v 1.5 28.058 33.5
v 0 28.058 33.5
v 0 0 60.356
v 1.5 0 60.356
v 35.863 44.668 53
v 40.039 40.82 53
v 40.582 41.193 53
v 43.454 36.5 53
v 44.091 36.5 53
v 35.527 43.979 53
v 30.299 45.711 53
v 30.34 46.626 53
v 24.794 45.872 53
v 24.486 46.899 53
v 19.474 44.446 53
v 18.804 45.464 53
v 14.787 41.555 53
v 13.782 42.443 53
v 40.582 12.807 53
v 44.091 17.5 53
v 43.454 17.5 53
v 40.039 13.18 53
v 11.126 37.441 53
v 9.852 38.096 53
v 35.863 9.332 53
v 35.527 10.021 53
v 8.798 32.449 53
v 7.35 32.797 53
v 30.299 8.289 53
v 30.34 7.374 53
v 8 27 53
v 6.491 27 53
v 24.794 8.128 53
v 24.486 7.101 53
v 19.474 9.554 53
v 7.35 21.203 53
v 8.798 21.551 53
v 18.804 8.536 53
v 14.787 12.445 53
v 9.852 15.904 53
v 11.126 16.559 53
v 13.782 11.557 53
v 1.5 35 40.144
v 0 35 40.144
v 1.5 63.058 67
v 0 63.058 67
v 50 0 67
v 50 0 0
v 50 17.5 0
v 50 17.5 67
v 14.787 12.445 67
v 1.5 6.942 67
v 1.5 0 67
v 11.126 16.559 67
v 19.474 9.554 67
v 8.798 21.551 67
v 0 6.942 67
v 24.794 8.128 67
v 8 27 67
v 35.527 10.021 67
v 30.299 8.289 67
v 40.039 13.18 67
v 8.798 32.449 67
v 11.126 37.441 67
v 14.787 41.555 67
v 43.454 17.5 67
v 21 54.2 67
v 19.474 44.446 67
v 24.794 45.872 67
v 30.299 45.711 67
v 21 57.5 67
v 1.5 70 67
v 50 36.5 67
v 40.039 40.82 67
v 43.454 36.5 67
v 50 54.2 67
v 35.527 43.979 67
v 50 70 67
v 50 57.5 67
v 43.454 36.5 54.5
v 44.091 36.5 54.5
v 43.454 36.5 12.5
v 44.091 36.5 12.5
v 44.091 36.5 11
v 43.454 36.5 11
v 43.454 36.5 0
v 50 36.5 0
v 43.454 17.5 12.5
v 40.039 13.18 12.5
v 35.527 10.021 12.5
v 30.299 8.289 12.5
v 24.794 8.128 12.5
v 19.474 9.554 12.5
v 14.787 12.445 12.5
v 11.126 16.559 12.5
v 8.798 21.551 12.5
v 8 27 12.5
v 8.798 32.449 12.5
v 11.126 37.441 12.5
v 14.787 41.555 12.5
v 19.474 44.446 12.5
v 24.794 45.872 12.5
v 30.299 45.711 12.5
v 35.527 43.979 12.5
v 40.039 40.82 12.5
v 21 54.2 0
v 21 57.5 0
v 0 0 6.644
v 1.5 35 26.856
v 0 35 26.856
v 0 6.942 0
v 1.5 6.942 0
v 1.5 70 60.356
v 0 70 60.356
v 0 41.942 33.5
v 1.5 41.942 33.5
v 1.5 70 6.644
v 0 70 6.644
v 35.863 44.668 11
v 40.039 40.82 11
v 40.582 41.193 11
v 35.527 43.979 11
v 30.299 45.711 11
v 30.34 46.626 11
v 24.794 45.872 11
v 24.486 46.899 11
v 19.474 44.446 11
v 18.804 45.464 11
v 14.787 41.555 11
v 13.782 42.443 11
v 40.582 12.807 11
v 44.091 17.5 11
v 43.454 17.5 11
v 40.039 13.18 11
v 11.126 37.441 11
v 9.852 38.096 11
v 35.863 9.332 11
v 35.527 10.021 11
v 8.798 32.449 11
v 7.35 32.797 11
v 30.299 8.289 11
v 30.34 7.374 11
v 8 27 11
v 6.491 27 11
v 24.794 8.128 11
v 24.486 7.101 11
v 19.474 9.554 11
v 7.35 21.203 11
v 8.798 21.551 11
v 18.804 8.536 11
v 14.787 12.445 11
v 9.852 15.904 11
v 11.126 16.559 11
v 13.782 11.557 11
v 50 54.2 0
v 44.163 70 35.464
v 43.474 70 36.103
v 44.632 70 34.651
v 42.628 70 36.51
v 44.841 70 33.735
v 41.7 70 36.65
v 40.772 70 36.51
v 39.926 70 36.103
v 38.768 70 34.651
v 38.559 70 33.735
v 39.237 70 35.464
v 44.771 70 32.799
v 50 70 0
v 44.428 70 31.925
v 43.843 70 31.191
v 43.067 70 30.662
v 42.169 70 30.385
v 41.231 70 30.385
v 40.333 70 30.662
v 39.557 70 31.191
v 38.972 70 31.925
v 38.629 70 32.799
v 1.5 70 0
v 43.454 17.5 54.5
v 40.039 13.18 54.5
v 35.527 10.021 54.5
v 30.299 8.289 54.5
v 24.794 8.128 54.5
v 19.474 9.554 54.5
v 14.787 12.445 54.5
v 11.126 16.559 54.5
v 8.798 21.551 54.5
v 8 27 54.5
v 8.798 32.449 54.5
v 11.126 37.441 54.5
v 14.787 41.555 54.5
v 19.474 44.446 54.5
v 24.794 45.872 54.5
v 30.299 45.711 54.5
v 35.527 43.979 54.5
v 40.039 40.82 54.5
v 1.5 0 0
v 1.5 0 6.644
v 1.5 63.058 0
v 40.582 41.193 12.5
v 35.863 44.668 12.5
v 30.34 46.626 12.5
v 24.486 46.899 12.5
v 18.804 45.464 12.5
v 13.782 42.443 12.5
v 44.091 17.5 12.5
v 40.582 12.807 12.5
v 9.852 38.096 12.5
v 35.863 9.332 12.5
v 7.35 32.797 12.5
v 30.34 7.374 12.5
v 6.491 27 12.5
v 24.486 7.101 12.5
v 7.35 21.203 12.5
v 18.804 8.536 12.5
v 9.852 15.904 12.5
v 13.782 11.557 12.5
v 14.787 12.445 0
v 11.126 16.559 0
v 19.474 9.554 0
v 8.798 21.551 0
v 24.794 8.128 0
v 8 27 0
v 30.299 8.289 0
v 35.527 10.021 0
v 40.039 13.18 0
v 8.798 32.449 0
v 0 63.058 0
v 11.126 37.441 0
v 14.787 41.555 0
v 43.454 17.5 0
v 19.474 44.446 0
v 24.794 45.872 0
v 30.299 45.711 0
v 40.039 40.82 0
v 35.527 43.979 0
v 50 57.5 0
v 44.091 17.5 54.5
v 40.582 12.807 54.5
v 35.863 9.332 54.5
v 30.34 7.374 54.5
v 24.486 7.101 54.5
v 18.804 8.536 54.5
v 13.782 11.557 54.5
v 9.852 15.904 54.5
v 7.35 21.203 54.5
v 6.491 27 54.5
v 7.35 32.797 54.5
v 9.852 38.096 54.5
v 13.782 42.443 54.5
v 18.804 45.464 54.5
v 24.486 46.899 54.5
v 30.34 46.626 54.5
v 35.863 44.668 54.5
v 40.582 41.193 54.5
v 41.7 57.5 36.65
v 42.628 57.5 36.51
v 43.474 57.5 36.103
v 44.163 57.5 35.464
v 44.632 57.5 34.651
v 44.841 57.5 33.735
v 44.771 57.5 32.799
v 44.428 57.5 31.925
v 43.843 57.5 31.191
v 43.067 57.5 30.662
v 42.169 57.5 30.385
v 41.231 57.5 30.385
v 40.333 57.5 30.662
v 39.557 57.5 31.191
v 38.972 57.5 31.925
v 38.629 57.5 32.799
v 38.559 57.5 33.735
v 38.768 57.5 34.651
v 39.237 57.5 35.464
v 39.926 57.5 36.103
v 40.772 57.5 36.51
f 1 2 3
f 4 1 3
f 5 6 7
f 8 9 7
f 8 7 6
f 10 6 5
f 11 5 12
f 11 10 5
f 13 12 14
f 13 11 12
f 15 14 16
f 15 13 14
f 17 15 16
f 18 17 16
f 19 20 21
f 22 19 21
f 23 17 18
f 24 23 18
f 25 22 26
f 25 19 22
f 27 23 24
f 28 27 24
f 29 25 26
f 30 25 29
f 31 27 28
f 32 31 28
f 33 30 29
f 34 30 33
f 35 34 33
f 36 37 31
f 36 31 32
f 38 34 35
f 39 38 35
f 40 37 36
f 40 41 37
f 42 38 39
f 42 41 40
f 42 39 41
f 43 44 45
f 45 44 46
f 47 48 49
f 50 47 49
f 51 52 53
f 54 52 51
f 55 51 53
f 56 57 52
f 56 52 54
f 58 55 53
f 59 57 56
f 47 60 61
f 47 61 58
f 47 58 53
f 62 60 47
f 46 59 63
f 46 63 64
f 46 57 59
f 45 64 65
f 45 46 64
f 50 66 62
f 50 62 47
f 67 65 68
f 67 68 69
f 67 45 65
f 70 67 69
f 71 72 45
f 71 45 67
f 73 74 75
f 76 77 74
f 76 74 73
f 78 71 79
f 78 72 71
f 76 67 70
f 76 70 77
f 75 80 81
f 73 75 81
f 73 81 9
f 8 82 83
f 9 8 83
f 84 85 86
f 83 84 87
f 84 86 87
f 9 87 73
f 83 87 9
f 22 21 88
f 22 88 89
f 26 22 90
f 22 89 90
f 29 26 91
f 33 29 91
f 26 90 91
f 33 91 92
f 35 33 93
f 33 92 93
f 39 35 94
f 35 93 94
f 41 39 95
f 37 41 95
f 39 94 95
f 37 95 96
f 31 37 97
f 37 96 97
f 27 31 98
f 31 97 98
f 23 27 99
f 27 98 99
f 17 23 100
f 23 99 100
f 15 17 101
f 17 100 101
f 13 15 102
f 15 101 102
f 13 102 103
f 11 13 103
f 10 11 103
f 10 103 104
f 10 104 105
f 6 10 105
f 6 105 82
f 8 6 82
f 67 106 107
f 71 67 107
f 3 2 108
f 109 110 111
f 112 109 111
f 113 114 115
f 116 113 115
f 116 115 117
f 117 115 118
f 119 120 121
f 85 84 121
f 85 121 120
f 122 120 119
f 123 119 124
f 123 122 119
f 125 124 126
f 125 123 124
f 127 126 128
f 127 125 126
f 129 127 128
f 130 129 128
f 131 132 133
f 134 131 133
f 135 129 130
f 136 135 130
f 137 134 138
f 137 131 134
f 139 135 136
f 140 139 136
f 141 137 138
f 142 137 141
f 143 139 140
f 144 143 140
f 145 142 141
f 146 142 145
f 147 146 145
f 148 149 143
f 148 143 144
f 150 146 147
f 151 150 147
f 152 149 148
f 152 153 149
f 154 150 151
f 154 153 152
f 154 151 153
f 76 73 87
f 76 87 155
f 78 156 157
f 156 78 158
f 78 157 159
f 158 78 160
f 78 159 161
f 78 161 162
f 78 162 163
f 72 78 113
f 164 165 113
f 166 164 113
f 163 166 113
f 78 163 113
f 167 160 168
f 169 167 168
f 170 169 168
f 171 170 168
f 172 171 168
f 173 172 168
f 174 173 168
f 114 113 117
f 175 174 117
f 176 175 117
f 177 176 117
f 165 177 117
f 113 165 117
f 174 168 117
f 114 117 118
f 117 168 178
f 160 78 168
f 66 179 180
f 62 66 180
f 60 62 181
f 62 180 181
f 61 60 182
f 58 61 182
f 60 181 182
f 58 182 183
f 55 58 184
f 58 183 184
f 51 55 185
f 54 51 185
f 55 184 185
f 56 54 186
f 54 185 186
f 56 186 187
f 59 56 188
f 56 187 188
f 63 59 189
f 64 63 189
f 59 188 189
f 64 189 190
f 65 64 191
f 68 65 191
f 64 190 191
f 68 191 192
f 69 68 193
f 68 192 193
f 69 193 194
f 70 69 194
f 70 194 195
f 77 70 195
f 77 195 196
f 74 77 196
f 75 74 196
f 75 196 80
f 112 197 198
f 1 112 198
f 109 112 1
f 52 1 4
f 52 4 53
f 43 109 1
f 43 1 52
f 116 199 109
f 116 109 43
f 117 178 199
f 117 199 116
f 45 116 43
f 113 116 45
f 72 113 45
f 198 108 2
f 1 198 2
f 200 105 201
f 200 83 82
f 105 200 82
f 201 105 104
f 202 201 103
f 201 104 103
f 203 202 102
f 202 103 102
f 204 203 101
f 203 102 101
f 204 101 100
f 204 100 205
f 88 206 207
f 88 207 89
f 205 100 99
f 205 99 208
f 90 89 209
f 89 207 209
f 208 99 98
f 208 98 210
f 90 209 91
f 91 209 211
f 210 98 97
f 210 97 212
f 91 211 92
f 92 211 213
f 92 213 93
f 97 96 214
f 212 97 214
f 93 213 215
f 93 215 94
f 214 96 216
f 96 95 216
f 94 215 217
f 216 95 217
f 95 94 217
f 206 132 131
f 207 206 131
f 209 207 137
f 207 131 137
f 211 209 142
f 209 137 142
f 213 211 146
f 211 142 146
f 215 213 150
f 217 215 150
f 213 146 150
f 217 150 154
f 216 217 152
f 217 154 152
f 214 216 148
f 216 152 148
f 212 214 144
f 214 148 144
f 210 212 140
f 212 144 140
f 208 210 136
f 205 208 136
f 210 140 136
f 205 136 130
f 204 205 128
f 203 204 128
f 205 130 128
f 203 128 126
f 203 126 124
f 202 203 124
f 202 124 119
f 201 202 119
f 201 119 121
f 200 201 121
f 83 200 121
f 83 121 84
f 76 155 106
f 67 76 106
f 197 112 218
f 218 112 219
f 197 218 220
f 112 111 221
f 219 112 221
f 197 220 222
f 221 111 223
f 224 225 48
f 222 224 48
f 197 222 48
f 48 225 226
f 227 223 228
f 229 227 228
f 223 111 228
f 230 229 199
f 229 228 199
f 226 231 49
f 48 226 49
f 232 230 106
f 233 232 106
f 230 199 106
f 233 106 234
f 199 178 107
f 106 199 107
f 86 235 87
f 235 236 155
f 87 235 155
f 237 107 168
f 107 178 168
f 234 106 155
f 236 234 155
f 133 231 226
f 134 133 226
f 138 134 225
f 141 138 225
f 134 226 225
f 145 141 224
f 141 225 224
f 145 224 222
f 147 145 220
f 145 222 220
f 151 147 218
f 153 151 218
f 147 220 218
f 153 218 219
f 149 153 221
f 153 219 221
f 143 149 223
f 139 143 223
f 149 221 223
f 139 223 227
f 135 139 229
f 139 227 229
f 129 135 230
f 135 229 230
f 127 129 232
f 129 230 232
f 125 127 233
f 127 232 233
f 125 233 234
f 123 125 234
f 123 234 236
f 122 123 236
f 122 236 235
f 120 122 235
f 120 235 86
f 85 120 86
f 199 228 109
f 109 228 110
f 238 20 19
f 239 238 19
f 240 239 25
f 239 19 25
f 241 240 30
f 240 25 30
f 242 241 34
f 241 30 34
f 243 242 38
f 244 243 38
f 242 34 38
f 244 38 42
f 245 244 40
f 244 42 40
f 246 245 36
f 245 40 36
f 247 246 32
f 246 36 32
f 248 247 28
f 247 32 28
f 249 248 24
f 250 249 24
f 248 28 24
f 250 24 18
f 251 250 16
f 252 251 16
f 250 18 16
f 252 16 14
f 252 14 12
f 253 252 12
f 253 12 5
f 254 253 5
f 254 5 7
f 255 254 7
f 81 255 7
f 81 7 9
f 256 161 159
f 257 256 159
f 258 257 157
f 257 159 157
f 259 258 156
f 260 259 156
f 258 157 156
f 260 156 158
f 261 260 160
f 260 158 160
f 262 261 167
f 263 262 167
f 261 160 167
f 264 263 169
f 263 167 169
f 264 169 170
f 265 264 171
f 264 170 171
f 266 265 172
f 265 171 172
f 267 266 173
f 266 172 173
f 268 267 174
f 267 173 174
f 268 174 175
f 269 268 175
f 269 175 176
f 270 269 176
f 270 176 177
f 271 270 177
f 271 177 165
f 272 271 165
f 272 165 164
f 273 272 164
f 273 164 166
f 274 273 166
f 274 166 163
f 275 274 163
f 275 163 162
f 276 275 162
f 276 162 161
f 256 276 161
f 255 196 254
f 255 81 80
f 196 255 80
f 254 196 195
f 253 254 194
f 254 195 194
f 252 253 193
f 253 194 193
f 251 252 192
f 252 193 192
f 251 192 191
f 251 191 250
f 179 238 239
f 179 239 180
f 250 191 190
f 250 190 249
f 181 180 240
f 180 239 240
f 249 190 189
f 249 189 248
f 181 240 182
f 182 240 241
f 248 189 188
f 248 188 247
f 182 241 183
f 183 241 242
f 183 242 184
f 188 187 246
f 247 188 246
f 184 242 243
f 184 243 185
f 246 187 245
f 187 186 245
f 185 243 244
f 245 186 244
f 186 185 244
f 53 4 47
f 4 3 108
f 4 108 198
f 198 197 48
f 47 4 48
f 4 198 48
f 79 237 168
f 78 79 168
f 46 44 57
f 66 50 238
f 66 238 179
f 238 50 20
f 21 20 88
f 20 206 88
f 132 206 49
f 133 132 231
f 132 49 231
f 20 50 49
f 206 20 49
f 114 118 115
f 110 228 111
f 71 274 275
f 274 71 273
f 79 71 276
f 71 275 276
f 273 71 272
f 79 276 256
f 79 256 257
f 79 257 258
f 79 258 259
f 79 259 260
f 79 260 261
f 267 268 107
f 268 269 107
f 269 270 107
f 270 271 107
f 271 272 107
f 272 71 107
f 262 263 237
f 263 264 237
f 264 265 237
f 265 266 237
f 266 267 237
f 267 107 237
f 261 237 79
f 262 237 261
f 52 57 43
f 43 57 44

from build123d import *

# Parameters (mm, degrees)
BOSS_EXTRU_1_DEPTH         = 67
ENL_V_MAT_EXTRU_1_REACH    = 111.037
ESQUISSE2_R                = 3.15
ENL_V_MAT_EXTRU_3_DEPTH    = 1.5
ESQUISSE12_W               = 4.842495097
ESQUISSE12_H               = 1.5
R_P_TITION_LIN_AIRE1_COUNT = 2
R_P_TITION_LIN_AIRE1_PITCH = 42


with BuildPart() as part:
    # Esquisse1 → Boss.-Extru.1 (new body)
    with BuildSketch(Plane.XY):
        with BuildLine():
            Line((0, 0), (50, 0))
            Line((50, 0), (50, 17.5))
            Line((50, 17.5), (43.454482672, 17.5))
            ThreePointArc((43.454482672, 17.5), (8, 27), (43.454482672, 36.5))
            Line((43.454482672, 36.5), (50, 36.5))
            Line((50, 36.5), (50, 54.2))
            Line((50, 54.2), (21, 54.2))
            Line((21, 54.2), (21, 57.5))
            Line((21, 57.5), (50, 57.5))
            Line((50, 57.5), (50, 70))
            Line((50, 70), (0, 70))
            Line((0, 70), (0, 0))
        make_face()
    extrude(amount=BOSS_EXTRU_1_DEPTH)

    # Esquisse2 → Enlèv. mat.-Extru.1 (cut, up to next)
    with BuildSketch(Plane(origin=(0, 70, 0), x_dir=(1, 0, 0), z_dir=(0, 1, 0)), mode=Mode.PRIVATE) as enl_v_mat_extru_1_sk1:
        with Locations(Location((41.7, -33.5, 0), (0, 0, 270))):
            Circle(ESQUISSE2_R)
    enl_v_mat_extru_1_tool1 = extrude(enl_v_mat_extru_1_sk1.sketch, amount=-ENL_V_MAT_EXTRU_1_REACH, mode=Mode.PRIVATE) & part.part
    add(enl_v_mat_extru_1_tool1.solids().sort_by_distance((41.7, 70, 33.5))[0], mode=Mode.SUBTRACT)

    # Esquisse8 → Enlèv. mat.-Extru.3 (cut)
    with BuildSketch(Plane.ZY):
        Polygon((63.532395101, 73.318993261), (33.5, 41.941864051), (3.467604899, 73.318993261), (-3.467604899, 66.681006739), (26.855644409, 35), (-3.467604899, 3.318993261), (3.467604899, -3.318993261), (33.5, 28.058135949), (63.532395101, -3.318993261), (70.467604899, 3.318993261), (40.144355591, 35), (70.467604899, 66.681006739), align=None)
    extrude(amount=-ENL_V_MAT_EXTRU_3_DEPTH, mode=Mode.SUBTRACT)

    # Esquisse12 → Enlèvement de matière-Révolution2 (revolve, cut)
    with BuildSketch(Plane(origin=(0, 27, 0), x_dir=(1, 0, 0), z_dir=(0, 1, 0))):
        with Locations((44.070102797, -53.75)):
            Rectangle(ESQUISSE12_W, ESQUISSE12_H)
    enl_vement_de_mati_re_r_volution2 = revolve(axis=Axis((26.491350346, 27, 66.236309337), (0, 0, -1)), mode=Mode.SUBTRACT)

    # Répétition linéaire1: Enlèvement de matière-Révolution2 ×2
    with Locations(*[(0, 0, -i * R_P_TITION_LIN_AIRE1_PITCH) for i in range(1, R_P_TITION_LIN_AIRE1_COUNT)]):
        add(enl_vement_de_mati_re_r_volution2, mode=Mode.SUBTRACT)


solid = part.part
